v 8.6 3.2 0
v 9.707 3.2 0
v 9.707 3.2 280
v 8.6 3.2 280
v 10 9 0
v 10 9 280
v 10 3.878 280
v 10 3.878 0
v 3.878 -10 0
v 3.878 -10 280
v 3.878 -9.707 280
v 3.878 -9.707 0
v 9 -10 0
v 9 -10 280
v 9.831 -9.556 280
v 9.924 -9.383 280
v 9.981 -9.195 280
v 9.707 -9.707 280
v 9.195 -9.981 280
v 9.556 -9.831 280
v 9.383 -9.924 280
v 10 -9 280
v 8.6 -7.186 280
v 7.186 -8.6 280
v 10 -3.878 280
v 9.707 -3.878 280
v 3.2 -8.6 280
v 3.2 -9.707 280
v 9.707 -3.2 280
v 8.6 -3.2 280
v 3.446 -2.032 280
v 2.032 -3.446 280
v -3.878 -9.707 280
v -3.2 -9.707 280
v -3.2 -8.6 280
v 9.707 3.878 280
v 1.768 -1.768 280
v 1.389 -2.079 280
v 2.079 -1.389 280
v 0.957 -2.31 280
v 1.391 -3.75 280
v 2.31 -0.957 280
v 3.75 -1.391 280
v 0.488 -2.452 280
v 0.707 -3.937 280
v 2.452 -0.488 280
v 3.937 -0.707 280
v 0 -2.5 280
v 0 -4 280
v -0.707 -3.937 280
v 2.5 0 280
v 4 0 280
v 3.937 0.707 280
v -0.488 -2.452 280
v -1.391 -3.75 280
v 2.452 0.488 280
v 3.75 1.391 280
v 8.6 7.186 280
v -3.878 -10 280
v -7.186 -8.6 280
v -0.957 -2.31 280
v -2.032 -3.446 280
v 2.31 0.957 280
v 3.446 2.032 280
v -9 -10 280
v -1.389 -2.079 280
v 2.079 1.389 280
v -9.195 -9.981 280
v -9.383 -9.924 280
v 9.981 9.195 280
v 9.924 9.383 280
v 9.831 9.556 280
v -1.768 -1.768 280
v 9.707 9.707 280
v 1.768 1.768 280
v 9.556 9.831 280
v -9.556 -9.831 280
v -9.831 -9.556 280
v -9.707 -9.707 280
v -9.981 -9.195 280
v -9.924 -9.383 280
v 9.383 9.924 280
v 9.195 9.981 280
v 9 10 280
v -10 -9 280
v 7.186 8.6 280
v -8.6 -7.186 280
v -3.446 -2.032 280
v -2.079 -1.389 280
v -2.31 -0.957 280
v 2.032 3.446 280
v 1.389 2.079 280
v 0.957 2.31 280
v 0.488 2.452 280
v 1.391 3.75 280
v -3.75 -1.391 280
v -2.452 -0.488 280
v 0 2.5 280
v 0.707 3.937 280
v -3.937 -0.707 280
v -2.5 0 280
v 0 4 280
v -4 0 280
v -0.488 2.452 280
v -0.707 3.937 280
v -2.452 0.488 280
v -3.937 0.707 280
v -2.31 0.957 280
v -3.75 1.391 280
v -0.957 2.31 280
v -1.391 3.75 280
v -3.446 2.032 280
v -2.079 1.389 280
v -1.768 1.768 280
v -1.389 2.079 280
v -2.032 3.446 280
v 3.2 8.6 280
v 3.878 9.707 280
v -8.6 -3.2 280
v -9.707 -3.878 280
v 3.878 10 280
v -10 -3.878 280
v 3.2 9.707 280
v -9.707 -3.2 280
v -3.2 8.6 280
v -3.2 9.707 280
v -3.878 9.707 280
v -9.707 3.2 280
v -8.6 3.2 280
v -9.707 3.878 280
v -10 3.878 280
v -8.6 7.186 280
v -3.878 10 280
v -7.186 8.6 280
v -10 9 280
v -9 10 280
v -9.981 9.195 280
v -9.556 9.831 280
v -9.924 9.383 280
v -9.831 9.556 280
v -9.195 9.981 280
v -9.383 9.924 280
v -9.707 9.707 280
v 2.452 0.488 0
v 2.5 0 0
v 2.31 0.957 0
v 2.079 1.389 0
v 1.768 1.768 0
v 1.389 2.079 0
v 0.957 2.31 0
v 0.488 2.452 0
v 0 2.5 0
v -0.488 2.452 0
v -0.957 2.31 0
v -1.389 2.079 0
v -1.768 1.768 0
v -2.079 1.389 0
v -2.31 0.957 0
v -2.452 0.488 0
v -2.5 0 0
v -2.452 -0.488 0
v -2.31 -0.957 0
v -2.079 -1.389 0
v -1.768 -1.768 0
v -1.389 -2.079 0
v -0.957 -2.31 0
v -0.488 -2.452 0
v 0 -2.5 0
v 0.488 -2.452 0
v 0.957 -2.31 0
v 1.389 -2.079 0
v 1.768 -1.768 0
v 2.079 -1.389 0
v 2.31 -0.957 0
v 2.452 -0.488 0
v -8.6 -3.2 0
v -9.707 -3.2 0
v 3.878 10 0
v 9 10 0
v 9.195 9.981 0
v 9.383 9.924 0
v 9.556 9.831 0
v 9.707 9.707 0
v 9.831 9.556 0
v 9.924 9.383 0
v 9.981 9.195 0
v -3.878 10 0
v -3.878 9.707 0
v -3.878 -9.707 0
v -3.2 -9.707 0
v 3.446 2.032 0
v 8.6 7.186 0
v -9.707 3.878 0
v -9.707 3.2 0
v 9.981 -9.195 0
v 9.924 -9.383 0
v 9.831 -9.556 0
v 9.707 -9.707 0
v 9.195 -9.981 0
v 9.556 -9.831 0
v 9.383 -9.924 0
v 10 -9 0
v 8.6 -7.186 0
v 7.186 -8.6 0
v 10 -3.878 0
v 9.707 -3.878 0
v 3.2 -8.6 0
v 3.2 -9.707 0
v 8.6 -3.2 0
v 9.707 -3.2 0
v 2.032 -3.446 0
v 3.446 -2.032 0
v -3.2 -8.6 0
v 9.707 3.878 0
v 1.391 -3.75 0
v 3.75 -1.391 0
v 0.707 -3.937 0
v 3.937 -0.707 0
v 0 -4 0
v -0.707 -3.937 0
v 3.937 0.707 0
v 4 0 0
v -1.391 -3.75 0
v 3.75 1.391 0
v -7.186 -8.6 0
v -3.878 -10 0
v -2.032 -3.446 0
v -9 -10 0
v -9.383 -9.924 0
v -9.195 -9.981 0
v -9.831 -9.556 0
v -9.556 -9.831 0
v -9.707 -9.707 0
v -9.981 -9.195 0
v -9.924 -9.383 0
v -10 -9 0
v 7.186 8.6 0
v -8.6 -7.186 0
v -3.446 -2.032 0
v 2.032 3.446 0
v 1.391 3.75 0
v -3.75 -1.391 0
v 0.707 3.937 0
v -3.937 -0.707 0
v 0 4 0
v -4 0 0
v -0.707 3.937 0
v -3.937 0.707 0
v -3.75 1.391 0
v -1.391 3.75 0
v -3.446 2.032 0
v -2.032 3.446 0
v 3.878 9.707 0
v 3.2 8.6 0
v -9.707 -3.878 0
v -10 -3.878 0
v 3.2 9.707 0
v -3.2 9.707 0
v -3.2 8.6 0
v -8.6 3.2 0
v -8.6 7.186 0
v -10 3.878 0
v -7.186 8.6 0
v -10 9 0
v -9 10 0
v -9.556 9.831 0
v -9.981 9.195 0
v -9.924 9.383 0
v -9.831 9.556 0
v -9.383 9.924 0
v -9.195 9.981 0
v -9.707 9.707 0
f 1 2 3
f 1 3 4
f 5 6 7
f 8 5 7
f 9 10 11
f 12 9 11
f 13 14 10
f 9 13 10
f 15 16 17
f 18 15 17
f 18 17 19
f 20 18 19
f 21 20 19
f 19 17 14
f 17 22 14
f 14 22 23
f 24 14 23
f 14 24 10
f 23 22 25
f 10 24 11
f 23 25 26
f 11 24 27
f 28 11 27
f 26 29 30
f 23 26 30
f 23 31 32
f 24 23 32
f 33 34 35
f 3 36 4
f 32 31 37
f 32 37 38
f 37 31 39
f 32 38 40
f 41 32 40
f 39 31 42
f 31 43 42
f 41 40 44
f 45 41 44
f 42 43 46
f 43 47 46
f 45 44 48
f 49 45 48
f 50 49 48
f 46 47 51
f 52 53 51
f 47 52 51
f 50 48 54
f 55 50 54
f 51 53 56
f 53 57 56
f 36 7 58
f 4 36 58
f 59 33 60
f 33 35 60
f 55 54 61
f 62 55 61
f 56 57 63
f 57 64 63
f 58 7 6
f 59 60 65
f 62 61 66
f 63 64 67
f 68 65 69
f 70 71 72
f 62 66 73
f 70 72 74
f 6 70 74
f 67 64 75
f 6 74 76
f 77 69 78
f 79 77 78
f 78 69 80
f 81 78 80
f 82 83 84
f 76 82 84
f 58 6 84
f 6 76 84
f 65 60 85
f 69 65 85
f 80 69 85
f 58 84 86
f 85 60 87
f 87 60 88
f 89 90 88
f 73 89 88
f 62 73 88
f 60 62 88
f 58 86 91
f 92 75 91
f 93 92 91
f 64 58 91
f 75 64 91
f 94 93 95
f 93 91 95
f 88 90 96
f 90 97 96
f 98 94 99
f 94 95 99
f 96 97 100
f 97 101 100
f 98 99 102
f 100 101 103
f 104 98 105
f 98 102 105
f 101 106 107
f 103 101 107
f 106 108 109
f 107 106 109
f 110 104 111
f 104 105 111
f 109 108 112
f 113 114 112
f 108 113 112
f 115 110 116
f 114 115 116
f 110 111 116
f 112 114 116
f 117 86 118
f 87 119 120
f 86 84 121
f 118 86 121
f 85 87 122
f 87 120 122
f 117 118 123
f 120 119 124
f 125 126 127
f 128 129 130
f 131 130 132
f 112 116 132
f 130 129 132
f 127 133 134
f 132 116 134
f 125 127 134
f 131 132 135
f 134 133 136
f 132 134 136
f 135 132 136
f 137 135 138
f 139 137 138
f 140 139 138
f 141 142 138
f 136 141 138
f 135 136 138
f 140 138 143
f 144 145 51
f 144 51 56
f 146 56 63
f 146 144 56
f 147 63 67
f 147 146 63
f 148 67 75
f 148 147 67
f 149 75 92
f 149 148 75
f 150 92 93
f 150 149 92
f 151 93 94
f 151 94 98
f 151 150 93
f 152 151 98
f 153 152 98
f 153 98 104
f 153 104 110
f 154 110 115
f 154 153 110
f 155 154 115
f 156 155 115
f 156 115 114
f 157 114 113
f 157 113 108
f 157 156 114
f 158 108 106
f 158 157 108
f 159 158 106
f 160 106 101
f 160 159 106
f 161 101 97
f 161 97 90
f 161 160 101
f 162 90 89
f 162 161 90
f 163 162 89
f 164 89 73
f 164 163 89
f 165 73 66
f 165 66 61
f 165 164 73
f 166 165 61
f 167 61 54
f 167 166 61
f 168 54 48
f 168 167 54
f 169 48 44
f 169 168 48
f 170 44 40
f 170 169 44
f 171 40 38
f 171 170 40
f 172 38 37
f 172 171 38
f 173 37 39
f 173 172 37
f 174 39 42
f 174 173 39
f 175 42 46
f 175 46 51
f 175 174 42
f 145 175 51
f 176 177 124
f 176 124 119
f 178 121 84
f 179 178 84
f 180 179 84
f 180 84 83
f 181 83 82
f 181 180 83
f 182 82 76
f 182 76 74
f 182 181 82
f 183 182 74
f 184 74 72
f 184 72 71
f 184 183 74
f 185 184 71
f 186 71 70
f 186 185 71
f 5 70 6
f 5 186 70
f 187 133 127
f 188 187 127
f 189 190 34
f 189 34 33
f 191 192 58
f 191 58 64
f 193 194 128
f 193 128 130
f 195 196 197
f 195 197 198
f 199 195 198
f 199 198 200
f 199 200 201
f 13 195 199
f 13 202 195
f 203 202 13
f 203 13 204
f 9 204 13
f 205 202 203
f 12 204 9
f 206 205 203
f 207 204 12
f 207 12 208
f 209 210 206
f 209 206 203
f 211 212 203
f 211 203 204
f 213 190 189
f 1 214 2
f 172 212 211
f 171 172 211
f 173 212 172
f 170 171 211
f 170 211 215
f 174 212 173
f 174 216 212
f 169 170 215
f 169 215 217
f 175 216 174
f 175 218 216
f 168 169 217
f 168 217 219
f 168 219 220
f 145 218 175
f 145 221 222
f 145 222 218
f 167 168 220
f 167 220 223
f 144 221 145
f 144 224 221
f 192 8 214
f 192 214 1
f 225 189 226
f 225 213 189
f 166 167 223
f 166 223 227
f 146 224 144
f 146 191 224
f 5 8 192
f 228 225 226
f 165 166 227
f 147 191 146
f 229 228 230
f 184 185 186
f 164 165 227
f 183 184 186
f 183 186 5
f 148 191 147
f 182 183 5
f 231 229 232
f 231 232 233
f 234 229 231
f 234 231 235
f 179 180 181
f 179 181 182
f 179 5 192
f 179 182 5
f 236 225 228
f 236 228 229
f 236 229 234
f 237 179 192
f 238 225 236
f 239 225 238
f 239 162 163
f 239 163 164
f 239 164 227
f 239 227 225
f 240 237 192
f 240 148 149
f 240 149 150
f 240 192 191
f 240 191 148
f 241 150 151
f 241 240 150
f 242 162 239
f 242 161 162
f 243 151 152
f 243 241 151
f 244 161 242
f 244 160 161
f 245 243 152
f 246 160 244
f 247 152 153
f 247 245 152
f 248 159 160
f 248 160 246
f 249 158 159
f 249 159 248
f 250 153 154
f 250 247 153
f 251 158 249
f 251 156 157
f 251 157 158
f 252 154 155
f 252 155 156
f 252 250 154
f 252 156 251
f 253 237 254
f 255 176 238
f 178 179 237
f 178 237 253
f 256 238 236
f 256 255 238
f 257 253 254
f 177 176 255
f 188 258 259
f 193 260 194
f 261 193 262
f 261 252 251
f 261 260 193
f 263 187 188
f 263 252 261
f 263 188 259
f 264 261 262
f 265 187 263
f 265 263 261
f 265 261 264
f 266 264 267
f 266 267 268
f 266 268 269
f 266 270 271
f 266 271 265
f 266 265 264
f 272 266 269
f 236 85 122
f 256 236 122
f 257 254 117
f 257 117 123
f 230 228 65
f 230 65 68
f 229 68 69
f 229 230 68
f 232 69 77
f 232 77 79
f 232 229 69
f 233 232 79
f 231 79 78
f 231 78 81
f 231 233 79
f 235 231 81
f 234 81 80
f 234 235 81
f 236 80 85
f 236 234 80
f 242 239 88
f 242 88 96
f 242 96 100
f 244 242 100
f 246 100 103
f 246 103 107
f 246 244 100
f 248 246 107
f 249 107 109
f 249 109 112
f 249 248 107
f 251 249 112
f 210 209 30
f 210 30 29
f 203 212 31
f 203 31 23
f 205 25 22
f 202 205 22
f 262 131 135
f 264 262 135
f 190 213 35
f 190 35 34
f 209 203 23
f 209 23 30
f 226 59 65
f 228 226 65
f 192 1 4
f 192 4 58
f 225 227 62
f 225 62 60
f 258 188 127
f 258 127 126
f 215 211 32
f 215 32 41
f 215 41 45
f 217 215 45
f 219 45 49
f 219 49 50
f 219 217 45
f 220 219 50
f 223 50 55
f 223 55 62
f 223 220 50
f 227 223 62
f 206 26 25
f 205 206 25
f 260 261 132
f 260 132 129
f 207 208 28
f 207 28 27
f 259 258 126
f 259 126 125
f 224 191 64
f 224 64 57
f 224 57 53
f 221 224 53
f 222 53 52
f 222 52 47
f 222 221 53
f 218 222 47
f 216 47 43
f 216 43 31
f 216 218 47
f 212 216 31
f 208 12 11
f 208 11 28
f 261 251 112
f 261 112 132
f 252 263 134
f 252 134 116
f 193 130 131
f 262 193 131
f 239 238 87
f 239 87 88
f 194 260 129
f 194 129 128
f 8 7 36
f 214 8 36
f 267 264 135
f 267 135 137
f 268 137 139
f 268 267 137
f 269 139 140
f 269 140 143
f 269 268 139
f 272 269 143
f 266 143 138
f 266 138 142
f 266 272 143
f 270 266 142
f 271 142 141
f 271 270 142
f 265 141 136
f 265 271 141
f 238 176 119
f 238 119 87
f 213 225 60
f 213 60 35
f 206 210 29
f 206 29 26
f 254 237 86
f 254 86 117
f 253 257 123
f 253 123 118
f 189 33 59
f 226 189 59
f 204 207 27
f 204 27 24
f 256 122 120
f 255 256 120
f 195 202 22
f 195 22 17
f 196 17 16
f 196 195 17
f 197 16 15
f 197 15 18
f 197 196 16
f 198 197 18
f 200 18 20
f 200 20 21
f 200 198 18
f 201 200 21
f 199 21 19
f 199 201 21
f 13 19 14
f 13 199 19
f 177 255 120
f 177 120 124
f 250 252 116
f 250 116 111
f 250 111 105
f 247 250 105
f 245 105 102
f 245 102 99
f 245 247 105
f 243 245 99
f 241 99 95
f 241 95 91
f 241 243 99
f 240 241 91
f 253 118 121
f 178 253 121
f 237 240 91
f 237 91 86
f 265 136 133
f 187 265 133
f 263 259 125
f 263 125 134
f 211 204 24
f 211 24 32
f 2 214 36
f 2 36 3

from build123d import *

# Parameters (mm, degrees)
SKETCH1_R           = 2.5
BOSS_EXTRUDE1_DEPTH = 280


with BuildPart() as part:
    # Sketch1 → Boss-Extrude1 (new body)
    with BuildSketch(Plane.XY):
        with BuildLine():
            Line((-9.707106781, -3.2), (-8.6, -3.2))
            Line((-8.6, -3.2), (-8.6, -7.185786438))
            Line((-8.6, -7.185786438), (-3.445719569, -2.031506006))
            ThreePointArc((-3.445719569, -2.031506006), (-4, 0), (-3.445719569, 2.031506006))
            Line((-3.445719569, 2.031506006), (-8.6, 7.185786438))
            Line((-8.6, 7.185786438), (-8.6, 3.2))
            Line((-8.6, 3.2), (-9.707106781, 3.2))
            Line((-9.707106781, 3.2), (-9.707106781, 3.877544562))
            Line((-9.707106781, 3.877544562), (-10, 3.877544562))
            Line((-10, 3.877544562), (-10, 9))
            ThreePointArc((-10, 9), (-9.707106781, 9.707106781), (-9, 10))
            Line((-9, 10), (-3.877544562, 10))
            Line((-3.877544562, 10), (-3.877544562, 9.707106781))
            Line((-3.877544562, 9.707106781), (-3.2, 9.707106781))
            Line((-3.2, 9.707106781), (-3.2, 8.6))
            Line((-3.2, 8.6), (-7.185786438, 8.6))
            Line((-7.185786438, 8.6), (-2.031506006, 3.445719569))
            ThreePointArc((-2.031506006, 3.445719569), (0, 4), (2.031506006, 3.445719569))
            Line((2.031506006, 3.445719569), (7.185786438, 8.6))
            Line((7.185786438, 8.6), (3.2, 8.6))
            Line((3.2, 8.6), (3.2, 9.707106781))
            Line((3.2, 9.707106781), (3.877544562, 9.707106781))
            Line((3.877544562, 9.707106781), (3.877544562, 10))
            Line((3.877544562, 10), (9, 10))
            ThreePointArc((9, 10), (9.707106781, 9.707106781), (10, 9))
            Line((10, 9), (10, 3.877544562))
            Line((10, 3.877544562), (9.707106781, 3.877544562))
            Line((9.707106781, 3.877544562), (9.707106781, 3.2))
            Line((9.707106781, 3.2), (8.6, 3.2))
            Line((8.6, 3.2), (8.6, 7.185786438))
            Line((8.6, 7.185786438), (3.445719569, 2.031506006))
            ThreePointArc((3.445719569, 2.031506006), (4, 0), (3.445719569, -2.031506006))
            Line((3.445719569, -2.031506006), (8.6, -7.185786438))
            Line((8.6, -7.185786438), (8.6, -3.2))
            Line((8.6, -3.2), (9.707106781, -3.2))
            Line((9.707106781, -3.2), (9.707106781, -3.877544562))
            Line((9.707106781, -3.877544562), (10, -3.877544562))
            Line((10, -3.877544562), (10, -9))
            ThreePointArc((10, -9), (9.707106781, -9.707106781), (9, -10))
            Line((9, -10), (3.877544562, -10))
            Line((3.877544562, -10), (3.877544562, -9.707106781))
            Line((3.877544562, -9.707106781), (3.2, -9.707106781))
            Line((3.2, -9.707106781), (3.2, -8.6))
            Line((3.2, -8.6), (7.185786438, -8.6))
            Line((7.185786438, -8.6), (2.031506006, -3.445719569))
            ThreePointArc((2.031506006, -3.445719569), (0, -4), (-2.031506006, -3.445719569))
            Line((-2.031506006, -3.445719569), (-7.185786438, -8.6))
            Line((-7.185786438, -8.6), (-3.2, -8.6))
            Line((-3.2, -8.6), (-3.2, -9.707106781))
            Line((-3.2, -9.707106781), (-3.877544562, -9.707106781))
            Line((-3.877544562, -9.707106781), (-3.877544562, -10))
            Line((-3.877544562, -10), (-9, -10))
            ThreePointArc((-9, -10), (-9.707106781, -9.707106781), (-10, -9))
            Line((-10, -9), (-10, -3.877544562))
            Line((-10, -3.877544562), (-9.707106781, -3.877544562))
            Line((-9.707106781, -3.877544562), (-9.707106781, -3.2))
        make_face()
        Circle(SKETCH1_R, mode=Mode.SUBTRACT)
    extrude(amount=BOSS_EXTRUDE1_DEPTH)


solid = part.part
